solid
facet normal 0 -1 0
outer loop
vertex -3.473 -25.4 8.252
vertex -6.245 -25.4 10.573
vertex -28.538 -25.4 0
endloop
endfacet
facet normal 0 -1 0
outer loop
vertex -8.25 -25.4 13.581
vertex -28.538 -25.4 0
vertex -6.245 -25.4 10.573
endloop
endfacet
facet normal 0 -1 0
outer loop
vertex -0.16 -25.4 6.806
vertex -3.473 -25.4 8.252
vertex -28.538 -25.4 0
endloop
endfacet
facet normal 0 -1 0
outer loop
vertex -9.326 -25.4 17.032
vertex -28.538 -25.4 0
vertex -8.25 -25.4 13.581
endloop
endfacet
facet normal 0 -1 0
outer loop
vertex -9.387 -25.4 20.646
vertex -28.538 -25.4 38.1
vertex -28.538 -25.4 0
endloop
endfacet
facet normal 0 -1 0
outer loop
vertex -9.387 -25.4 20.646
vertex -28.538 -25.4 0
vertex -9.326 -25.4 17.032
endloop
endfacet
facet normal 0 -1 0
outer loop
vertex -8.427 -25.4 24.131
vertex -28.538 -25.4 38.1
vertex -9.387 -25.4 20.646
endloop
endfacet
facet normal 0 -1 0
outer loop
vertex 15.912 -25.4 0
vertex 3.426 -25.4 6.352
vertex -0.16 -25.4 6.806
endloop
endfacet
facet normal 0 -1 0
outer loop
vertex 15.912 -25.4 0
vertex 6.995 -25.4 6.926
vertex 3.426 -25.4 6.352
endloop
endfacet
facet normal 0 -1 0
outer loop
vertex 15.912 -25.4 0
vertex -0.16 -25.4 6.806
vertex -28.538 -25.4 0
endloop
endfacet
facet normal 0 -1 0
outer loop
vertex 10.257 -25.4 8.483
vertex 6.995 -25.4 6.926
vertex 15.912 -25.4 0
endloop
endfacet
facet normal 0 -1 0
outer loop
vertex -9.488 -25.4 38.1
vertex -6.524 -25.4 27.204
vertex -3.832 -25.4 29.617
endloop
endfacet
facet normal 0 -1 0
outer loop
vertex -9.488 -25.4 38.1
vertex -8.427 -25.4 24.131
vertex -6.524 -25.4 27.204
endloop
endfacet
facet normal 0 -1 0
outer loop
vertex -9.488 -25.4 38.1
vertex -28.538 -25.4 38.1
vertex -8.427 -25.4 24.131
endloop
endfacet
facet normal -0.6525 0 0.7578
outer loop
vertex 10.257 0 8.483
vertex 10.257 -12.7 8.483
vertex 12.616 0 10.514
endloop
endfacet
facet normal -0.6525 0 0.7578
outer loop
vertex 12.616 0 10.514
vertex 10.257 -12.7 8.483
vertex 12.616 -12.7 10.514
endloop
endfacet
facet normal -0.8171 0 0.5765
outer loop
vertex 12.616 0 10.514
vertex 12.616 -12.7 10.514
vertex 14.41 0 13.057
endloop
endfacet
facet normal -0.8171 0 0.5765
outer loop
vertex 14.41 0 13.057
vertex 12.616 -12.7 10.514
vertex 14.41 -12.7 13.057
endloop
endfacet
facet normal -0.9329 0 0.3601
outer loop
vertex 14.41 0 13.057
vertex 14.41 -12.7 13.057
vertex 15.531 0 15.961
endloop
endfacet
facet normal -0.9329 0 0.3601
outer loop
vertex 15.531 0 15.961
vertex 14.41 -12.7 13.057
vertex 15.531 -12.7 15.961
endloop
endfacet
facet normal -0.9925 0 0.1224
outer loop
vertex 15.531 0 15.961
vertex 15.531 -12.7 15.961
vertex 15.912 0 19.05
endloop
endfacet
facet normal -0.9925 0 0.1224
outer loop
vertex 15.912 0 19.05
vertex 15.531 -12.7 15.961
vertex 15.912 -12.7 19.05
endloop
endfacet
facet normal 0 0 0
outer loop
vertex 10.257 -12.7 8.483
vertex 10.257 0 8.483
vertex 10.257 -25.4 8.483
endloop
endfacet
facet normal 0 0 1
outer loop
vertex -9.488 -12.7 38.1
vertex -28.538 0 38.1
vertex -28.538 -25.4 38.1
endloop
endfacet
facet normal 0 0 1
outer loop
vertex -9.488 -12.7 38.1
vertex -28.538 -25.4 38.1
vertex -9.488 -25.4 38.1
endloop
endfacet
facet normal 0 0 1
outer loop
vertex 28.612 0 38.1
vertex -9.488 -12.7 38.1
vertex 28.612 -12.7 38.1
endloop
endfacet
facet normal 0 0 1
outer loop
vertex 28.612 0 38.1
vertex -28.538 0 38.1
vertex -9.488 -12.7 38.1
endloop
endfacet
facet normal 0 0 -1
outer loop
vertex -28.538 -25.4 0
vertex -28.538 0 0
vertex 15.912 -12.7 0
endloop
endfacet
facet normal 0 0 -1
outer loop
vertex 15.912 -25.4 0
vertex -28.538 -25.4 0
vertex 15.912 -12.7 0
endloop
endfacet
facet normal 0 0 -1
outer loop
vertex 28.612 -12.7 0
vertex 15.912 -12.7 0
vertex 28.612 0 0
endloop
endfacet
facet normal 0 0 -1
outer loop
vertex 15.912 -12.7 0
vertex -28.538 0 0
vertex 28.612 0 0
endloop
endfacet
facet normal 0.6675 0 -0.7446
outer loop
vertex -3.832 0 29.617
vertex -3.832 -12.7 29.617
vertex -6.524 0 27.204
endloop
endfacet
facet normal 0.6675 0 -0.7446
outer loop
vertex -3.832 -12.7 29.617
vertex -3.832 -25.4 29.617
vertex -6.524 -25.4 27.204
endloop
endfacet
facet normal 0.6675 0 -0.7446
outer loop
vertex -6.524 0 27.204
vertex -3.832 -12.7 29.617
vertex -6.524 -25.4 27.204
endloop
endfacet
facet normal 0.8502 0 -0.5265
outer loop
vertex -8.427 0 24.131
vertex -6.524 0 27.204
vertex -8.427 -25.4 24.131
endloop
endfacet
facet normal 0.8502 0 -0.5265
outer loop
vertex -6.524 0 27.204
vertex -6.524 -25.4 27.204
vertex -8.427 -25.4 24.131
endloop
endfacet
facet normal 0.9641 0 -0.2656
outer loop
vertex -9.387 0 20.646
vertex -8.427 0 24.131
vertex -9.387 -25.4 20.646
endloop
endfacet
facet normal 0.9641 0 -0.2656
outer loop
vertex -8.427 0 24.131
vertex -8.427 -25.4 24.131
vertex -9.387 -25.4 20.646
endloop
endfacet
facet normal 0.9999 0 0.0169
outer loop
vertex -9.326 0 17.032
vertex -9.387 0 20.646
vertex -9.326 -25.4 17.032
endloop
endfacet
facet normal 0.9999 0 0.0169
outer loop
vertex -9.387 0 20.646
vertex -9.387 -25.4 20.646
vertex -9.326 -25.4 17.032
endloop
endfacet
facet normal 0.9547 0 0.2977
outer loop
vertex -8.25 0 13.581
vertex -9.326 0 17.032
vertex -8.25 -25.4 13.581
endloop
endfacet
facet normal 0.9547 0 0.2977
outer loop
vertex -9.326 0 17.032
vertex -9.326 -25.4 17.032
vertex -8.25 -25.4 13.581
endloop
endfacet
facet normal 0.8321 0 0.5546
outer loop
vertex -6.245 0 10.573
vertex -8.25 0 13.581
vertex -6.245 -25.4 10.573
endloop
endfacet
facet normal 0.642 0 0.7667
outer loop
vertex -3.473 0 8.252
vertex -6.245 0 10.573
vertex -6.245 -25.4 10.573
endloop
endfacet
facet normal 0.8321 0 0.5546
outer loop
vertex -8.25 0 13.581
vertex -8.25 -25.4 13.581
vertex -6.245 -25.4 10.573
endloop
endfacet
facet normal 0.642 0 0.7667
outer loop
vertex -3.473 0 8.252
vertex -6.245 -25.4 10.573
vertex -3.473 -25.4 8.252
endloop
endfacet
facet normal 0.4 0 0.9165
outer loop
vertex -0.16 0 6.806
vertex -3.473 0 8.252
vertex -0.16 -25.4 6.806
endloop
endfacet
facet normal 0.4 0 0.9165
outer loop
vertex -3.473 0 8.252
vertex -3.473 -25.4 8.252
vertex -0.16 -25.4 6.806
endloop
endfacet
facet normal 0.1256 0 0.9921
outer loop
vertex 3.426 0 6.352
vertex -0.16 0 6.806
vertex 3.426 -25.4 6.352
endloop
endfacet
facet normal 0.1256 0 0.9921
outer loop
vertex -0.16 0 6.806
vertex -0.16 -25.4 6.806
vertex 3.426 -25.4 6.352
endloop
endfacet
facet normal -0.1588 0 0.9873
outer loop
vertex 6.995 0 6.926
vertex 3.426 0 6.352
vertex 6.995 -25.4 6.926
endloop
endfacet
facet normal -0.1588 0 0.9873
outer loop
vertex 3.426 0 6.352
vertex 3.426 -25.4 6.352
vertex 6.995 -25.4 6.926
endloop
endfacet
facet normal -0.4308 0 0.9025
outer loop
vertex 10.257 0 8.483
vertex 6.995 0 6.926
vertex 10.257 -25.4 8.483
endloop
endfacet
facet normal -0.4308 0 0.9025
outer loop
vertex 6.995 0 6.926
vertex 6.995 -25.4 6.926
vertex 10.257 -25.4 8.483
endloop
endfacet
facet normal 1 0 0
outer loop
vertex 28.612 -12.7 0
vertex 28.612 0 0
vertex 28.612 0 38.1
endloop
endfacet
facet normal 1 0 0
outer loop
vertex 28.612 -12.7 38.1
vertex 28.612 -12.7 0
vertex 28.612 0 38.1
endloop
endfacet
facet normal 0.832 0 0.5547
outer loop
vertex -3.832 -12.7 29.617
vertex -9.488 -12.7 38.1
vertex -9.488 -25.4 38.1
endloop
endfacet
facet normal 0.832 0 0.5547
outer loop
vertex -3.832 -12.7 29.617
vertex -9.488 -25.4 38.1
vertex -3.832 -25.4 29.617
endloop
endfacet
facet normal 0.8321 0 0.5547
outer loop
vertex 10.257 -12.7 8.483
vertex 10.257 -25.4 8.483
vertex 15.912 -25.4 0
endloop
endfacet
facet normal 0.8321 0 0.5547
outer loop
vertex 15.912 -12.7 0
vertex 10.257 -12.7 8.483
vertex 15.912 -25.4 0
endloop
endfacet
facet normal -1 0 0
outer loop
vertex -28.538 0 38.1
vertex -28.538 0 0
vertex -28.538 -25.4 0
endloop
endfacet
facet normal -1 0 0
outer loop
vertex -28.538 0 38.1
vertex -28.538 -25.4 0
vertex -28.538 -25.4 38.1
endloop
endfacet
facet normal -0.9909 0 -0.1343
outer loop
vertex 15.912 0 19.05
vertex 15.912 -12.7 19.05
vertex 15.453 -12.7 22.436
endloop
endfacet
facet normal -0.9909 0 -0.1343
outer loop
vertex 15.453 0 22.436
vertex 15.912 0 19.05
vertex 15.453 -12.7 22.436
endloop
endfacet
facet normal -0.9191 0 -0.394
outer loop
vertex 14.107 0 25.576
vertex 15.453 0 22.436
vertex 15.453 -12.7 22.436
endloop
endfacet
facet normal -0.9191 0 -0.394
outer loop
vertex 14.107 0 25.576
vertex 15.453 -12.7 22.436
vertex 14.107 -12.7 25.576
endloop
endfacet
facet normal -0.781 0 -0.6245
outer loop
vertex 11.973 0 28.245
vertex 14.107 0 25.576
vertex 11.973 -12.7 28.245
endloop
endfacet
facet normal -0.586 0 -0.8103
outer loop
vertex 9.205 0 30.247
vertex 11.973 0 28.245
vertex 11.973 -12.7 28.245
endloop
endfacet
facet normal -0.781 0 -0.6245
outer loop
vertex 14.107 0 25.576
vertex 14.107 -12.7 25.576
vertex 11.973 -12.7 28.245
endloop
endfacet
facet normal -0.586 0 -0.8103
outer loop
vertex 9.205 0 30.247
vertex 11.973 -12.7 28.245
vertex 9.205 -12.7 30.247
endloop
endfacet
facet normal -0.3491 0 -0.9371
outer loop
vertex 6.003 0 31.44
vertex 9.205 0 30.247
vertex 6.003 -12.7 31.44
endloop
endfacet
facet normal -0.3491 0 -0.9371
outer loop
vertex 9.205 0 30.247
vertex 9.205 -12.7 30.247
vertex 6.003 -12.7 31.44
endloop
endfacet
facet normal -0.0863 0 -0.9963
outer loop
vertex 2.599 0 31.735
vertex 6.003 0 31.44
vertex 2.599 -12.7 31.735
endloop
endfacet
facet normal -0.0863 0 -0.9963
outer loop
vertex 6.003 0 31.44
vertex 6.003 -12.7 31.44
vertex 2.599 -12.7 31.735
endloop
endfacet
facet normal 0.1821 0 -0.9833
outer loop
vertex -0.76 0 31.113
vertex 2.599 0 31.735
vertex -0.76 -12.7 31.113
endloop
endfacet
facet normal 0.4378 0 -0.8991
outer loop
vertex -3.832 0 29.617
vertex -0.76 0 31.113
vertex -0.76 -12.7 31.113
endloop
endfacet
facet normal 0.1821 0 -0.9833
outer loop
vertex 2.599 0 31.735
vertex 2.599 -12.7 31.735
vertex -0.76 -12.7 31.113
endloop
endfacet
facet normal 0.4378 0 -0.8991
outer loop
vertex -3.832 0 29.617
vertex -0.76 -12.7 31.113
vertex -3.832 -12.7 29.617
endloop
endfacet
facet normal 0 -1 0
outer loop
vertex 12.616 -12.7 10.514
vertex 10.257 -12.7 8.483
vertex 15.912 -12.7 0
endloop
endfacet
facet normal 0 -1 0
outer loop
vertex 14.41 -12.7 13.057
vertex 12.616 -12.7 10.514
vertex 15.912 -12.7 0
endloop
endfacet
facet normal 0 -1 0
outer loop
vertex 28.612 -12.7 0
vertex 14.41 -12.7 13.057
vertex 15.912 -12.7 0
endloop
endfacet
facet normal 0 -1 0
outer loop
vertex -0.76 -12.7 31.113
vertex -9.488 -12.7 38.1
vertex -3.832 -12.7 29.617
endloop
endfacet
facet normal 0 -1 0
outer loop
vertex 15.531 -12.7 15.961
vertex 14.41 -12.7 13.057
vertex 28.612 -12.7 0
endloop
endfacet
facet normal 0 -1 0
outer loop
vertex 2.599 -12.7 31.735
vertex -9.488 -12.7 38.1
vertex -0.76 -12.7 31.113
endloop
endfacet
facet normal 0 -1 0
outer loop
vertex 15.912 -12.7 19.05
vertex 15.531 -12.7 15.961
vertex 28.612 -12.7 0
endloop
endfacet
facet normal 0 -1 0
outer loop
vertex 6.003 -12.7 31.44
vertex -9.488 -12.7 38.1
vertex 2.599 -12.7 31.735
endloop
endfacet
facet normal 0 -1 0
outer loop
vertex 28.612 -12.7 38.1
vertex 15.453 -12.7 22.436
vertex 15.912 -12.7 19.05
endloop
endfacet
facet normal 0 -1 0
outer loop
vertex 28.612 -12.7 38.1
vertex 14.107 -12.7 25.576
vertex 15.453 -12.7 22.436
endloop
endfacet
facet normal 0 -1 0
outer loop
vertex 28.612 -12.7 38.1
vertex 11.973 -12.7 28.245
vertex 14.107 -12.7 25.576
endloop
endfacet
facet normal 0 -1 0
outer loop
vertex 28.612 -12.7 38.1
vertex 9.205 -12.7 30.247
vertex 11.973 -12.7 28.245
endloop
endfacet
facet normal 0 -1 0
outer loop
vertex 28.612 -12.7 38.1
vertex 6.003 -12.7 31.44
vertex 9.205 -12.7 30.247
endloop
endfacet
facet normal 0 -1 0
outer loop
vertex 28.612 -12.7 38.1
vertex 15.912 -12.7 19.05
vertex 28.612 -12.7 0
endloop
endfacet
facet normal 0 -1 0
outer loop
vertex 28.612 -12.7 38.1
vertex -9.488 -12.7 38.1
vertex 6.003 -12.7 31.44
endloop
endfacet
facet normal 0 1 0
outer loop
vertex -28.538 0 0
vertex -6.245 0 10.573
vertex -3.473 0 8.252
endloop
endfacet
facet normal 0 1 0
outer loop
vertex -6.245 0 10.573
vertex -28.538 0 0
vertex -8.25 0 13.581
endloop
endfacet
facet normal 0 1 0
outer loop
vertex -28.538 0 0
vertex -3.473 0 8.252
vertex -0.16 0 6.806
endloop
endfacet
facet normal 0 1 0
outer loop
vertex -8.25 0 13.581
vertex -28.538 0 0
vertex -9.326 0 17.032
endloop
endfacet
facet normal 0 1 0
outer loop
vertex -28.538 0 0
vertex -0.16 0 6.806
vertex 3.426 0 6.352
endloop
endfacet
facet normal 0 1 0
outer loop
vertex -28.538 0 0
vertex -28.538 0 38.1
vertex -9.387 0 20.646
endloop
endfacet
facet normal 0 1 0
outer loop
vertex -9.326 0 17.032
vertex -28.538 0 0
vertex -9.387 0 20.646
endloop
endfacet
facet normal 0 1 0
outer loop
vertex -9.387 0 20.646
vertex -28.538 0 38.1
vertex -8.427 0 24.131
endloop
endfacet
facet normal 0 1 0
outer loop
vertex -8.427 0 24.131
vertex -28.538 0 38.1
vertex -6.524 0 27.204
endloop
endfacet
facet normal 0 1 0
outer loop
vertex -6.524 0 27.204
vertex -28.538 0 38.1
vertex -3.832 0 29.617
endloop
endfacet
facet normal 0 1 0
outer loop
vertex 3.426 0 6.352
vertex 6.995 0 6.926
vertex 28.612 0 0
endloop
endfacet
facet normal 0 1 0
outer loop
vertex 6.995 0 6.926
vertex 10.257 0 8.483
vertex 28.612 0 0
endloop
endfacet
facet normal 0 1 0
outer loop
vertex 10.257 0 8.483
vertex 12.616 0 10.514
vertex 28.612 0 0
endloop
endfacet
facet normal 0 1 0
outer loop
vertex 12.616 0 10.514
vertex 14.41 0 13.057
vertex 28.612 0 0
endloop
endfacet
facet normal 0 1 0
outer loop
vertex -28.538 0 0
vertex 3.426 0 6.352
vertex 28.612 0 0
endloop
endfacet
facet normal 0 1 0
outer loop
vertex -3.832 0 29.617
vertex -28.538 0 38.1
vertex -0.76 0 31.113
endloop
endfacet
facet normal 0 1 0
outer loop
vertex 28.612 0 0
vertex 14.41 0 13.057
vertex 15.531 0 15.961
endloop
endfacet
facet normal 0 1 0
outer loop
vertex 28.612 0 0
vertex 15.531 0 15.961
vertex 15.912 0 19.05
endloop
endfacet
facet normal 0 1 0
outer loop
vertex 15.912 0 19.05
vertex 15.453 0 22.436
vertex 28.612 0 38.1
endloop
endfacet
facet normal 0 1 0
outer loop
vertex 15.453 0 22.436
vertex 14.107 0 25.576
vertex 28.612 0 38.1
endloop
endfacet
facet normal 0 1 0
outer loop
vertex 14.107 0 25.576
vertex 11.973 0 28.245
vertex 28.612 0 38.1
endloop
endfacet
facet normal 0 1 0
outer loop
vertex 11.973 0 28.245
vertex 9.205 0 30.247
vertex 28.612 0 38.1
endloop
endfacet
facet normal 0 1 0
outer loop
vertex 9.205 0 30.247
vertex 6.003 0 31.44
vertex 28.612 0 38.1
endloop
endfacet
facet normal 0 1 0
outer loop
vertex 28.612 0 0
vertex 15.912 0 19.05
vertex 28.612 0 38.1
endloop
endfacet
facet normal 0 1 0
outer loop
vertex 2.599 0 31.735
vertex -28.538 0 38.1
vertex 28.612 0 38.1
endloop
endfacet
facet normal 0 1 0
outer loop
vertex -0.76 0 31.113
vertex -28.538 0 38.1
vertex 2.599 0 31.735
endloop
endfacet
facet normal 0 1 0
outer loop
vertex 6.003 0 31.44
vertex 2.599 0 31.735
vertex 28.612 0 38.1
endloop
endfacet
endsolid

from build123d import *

# Parameters (mm, degrees)
F0_W     = 57.15
F0_H     = 38.1
F1_DEPTH = 25.4
F2_W     = 12.7
F2_H     = 12.7
F3_DEPTH = 38.101
F5_DEPTH = 12.7
F7_DEPTH = 25.401


with BuildPart() as f1:
    # F0 (on Front) → F1 (new body)
    with BuildSketch(Plane.XZ):
        with Locations((0.037352, 19.05)):
            Rectangle(F0_W, F0_H)
    extrude(amount=F1_DEPTH)

    # F2 (on face) → F3 (cut, through all)
    with BuildSketch(Plane.XY.offset(38.1)):
        with Locations((22.262352, -19.05)):
            Rectangle(F2_W, F2_H)
    extrude(amount=-F3_DEPTH, mode=Mode.SUBTRACT)

    # F4 (on face) → F5 (cut)
    with BuildSketch(Plane.XZ.offset(25.4)):
        Polygon((15.912352, 38.1), (-9.487648, 38.1), (15.912352, 0), align=None)
    extrude(amount=-F5_DEPTH, mode=Mode.SUBTRACT)

    # F6 (on face) → F7 (cut, through all)
    with BuildSketch(Plane.XZ.offset(25.4)):
        with BuildLine():
            Line((10.257044, 8.482961), (-3.832341, 29.617039))
            ThreePointArc((-3.832341, 29.617039), (-7.354687, 12.005308), (10.257044, 8.482961))
        make_face()
        with BuildLine():
            ThreePointArc((10.257044, 8.482961), (14.409619, 13.057404), (15.912352, 19.05))
            ThreePointArc((15.912352, 19.05), (9.204947, 30.247267), (-3.832341, 29.617039))
            Line((-3.832341, 29.617039), (10.257044, 8.482961))
        make_face()
    extrude(amount=-F7_DEPTH, mode=Mode.SUBTRACT)


solid = f1.part
